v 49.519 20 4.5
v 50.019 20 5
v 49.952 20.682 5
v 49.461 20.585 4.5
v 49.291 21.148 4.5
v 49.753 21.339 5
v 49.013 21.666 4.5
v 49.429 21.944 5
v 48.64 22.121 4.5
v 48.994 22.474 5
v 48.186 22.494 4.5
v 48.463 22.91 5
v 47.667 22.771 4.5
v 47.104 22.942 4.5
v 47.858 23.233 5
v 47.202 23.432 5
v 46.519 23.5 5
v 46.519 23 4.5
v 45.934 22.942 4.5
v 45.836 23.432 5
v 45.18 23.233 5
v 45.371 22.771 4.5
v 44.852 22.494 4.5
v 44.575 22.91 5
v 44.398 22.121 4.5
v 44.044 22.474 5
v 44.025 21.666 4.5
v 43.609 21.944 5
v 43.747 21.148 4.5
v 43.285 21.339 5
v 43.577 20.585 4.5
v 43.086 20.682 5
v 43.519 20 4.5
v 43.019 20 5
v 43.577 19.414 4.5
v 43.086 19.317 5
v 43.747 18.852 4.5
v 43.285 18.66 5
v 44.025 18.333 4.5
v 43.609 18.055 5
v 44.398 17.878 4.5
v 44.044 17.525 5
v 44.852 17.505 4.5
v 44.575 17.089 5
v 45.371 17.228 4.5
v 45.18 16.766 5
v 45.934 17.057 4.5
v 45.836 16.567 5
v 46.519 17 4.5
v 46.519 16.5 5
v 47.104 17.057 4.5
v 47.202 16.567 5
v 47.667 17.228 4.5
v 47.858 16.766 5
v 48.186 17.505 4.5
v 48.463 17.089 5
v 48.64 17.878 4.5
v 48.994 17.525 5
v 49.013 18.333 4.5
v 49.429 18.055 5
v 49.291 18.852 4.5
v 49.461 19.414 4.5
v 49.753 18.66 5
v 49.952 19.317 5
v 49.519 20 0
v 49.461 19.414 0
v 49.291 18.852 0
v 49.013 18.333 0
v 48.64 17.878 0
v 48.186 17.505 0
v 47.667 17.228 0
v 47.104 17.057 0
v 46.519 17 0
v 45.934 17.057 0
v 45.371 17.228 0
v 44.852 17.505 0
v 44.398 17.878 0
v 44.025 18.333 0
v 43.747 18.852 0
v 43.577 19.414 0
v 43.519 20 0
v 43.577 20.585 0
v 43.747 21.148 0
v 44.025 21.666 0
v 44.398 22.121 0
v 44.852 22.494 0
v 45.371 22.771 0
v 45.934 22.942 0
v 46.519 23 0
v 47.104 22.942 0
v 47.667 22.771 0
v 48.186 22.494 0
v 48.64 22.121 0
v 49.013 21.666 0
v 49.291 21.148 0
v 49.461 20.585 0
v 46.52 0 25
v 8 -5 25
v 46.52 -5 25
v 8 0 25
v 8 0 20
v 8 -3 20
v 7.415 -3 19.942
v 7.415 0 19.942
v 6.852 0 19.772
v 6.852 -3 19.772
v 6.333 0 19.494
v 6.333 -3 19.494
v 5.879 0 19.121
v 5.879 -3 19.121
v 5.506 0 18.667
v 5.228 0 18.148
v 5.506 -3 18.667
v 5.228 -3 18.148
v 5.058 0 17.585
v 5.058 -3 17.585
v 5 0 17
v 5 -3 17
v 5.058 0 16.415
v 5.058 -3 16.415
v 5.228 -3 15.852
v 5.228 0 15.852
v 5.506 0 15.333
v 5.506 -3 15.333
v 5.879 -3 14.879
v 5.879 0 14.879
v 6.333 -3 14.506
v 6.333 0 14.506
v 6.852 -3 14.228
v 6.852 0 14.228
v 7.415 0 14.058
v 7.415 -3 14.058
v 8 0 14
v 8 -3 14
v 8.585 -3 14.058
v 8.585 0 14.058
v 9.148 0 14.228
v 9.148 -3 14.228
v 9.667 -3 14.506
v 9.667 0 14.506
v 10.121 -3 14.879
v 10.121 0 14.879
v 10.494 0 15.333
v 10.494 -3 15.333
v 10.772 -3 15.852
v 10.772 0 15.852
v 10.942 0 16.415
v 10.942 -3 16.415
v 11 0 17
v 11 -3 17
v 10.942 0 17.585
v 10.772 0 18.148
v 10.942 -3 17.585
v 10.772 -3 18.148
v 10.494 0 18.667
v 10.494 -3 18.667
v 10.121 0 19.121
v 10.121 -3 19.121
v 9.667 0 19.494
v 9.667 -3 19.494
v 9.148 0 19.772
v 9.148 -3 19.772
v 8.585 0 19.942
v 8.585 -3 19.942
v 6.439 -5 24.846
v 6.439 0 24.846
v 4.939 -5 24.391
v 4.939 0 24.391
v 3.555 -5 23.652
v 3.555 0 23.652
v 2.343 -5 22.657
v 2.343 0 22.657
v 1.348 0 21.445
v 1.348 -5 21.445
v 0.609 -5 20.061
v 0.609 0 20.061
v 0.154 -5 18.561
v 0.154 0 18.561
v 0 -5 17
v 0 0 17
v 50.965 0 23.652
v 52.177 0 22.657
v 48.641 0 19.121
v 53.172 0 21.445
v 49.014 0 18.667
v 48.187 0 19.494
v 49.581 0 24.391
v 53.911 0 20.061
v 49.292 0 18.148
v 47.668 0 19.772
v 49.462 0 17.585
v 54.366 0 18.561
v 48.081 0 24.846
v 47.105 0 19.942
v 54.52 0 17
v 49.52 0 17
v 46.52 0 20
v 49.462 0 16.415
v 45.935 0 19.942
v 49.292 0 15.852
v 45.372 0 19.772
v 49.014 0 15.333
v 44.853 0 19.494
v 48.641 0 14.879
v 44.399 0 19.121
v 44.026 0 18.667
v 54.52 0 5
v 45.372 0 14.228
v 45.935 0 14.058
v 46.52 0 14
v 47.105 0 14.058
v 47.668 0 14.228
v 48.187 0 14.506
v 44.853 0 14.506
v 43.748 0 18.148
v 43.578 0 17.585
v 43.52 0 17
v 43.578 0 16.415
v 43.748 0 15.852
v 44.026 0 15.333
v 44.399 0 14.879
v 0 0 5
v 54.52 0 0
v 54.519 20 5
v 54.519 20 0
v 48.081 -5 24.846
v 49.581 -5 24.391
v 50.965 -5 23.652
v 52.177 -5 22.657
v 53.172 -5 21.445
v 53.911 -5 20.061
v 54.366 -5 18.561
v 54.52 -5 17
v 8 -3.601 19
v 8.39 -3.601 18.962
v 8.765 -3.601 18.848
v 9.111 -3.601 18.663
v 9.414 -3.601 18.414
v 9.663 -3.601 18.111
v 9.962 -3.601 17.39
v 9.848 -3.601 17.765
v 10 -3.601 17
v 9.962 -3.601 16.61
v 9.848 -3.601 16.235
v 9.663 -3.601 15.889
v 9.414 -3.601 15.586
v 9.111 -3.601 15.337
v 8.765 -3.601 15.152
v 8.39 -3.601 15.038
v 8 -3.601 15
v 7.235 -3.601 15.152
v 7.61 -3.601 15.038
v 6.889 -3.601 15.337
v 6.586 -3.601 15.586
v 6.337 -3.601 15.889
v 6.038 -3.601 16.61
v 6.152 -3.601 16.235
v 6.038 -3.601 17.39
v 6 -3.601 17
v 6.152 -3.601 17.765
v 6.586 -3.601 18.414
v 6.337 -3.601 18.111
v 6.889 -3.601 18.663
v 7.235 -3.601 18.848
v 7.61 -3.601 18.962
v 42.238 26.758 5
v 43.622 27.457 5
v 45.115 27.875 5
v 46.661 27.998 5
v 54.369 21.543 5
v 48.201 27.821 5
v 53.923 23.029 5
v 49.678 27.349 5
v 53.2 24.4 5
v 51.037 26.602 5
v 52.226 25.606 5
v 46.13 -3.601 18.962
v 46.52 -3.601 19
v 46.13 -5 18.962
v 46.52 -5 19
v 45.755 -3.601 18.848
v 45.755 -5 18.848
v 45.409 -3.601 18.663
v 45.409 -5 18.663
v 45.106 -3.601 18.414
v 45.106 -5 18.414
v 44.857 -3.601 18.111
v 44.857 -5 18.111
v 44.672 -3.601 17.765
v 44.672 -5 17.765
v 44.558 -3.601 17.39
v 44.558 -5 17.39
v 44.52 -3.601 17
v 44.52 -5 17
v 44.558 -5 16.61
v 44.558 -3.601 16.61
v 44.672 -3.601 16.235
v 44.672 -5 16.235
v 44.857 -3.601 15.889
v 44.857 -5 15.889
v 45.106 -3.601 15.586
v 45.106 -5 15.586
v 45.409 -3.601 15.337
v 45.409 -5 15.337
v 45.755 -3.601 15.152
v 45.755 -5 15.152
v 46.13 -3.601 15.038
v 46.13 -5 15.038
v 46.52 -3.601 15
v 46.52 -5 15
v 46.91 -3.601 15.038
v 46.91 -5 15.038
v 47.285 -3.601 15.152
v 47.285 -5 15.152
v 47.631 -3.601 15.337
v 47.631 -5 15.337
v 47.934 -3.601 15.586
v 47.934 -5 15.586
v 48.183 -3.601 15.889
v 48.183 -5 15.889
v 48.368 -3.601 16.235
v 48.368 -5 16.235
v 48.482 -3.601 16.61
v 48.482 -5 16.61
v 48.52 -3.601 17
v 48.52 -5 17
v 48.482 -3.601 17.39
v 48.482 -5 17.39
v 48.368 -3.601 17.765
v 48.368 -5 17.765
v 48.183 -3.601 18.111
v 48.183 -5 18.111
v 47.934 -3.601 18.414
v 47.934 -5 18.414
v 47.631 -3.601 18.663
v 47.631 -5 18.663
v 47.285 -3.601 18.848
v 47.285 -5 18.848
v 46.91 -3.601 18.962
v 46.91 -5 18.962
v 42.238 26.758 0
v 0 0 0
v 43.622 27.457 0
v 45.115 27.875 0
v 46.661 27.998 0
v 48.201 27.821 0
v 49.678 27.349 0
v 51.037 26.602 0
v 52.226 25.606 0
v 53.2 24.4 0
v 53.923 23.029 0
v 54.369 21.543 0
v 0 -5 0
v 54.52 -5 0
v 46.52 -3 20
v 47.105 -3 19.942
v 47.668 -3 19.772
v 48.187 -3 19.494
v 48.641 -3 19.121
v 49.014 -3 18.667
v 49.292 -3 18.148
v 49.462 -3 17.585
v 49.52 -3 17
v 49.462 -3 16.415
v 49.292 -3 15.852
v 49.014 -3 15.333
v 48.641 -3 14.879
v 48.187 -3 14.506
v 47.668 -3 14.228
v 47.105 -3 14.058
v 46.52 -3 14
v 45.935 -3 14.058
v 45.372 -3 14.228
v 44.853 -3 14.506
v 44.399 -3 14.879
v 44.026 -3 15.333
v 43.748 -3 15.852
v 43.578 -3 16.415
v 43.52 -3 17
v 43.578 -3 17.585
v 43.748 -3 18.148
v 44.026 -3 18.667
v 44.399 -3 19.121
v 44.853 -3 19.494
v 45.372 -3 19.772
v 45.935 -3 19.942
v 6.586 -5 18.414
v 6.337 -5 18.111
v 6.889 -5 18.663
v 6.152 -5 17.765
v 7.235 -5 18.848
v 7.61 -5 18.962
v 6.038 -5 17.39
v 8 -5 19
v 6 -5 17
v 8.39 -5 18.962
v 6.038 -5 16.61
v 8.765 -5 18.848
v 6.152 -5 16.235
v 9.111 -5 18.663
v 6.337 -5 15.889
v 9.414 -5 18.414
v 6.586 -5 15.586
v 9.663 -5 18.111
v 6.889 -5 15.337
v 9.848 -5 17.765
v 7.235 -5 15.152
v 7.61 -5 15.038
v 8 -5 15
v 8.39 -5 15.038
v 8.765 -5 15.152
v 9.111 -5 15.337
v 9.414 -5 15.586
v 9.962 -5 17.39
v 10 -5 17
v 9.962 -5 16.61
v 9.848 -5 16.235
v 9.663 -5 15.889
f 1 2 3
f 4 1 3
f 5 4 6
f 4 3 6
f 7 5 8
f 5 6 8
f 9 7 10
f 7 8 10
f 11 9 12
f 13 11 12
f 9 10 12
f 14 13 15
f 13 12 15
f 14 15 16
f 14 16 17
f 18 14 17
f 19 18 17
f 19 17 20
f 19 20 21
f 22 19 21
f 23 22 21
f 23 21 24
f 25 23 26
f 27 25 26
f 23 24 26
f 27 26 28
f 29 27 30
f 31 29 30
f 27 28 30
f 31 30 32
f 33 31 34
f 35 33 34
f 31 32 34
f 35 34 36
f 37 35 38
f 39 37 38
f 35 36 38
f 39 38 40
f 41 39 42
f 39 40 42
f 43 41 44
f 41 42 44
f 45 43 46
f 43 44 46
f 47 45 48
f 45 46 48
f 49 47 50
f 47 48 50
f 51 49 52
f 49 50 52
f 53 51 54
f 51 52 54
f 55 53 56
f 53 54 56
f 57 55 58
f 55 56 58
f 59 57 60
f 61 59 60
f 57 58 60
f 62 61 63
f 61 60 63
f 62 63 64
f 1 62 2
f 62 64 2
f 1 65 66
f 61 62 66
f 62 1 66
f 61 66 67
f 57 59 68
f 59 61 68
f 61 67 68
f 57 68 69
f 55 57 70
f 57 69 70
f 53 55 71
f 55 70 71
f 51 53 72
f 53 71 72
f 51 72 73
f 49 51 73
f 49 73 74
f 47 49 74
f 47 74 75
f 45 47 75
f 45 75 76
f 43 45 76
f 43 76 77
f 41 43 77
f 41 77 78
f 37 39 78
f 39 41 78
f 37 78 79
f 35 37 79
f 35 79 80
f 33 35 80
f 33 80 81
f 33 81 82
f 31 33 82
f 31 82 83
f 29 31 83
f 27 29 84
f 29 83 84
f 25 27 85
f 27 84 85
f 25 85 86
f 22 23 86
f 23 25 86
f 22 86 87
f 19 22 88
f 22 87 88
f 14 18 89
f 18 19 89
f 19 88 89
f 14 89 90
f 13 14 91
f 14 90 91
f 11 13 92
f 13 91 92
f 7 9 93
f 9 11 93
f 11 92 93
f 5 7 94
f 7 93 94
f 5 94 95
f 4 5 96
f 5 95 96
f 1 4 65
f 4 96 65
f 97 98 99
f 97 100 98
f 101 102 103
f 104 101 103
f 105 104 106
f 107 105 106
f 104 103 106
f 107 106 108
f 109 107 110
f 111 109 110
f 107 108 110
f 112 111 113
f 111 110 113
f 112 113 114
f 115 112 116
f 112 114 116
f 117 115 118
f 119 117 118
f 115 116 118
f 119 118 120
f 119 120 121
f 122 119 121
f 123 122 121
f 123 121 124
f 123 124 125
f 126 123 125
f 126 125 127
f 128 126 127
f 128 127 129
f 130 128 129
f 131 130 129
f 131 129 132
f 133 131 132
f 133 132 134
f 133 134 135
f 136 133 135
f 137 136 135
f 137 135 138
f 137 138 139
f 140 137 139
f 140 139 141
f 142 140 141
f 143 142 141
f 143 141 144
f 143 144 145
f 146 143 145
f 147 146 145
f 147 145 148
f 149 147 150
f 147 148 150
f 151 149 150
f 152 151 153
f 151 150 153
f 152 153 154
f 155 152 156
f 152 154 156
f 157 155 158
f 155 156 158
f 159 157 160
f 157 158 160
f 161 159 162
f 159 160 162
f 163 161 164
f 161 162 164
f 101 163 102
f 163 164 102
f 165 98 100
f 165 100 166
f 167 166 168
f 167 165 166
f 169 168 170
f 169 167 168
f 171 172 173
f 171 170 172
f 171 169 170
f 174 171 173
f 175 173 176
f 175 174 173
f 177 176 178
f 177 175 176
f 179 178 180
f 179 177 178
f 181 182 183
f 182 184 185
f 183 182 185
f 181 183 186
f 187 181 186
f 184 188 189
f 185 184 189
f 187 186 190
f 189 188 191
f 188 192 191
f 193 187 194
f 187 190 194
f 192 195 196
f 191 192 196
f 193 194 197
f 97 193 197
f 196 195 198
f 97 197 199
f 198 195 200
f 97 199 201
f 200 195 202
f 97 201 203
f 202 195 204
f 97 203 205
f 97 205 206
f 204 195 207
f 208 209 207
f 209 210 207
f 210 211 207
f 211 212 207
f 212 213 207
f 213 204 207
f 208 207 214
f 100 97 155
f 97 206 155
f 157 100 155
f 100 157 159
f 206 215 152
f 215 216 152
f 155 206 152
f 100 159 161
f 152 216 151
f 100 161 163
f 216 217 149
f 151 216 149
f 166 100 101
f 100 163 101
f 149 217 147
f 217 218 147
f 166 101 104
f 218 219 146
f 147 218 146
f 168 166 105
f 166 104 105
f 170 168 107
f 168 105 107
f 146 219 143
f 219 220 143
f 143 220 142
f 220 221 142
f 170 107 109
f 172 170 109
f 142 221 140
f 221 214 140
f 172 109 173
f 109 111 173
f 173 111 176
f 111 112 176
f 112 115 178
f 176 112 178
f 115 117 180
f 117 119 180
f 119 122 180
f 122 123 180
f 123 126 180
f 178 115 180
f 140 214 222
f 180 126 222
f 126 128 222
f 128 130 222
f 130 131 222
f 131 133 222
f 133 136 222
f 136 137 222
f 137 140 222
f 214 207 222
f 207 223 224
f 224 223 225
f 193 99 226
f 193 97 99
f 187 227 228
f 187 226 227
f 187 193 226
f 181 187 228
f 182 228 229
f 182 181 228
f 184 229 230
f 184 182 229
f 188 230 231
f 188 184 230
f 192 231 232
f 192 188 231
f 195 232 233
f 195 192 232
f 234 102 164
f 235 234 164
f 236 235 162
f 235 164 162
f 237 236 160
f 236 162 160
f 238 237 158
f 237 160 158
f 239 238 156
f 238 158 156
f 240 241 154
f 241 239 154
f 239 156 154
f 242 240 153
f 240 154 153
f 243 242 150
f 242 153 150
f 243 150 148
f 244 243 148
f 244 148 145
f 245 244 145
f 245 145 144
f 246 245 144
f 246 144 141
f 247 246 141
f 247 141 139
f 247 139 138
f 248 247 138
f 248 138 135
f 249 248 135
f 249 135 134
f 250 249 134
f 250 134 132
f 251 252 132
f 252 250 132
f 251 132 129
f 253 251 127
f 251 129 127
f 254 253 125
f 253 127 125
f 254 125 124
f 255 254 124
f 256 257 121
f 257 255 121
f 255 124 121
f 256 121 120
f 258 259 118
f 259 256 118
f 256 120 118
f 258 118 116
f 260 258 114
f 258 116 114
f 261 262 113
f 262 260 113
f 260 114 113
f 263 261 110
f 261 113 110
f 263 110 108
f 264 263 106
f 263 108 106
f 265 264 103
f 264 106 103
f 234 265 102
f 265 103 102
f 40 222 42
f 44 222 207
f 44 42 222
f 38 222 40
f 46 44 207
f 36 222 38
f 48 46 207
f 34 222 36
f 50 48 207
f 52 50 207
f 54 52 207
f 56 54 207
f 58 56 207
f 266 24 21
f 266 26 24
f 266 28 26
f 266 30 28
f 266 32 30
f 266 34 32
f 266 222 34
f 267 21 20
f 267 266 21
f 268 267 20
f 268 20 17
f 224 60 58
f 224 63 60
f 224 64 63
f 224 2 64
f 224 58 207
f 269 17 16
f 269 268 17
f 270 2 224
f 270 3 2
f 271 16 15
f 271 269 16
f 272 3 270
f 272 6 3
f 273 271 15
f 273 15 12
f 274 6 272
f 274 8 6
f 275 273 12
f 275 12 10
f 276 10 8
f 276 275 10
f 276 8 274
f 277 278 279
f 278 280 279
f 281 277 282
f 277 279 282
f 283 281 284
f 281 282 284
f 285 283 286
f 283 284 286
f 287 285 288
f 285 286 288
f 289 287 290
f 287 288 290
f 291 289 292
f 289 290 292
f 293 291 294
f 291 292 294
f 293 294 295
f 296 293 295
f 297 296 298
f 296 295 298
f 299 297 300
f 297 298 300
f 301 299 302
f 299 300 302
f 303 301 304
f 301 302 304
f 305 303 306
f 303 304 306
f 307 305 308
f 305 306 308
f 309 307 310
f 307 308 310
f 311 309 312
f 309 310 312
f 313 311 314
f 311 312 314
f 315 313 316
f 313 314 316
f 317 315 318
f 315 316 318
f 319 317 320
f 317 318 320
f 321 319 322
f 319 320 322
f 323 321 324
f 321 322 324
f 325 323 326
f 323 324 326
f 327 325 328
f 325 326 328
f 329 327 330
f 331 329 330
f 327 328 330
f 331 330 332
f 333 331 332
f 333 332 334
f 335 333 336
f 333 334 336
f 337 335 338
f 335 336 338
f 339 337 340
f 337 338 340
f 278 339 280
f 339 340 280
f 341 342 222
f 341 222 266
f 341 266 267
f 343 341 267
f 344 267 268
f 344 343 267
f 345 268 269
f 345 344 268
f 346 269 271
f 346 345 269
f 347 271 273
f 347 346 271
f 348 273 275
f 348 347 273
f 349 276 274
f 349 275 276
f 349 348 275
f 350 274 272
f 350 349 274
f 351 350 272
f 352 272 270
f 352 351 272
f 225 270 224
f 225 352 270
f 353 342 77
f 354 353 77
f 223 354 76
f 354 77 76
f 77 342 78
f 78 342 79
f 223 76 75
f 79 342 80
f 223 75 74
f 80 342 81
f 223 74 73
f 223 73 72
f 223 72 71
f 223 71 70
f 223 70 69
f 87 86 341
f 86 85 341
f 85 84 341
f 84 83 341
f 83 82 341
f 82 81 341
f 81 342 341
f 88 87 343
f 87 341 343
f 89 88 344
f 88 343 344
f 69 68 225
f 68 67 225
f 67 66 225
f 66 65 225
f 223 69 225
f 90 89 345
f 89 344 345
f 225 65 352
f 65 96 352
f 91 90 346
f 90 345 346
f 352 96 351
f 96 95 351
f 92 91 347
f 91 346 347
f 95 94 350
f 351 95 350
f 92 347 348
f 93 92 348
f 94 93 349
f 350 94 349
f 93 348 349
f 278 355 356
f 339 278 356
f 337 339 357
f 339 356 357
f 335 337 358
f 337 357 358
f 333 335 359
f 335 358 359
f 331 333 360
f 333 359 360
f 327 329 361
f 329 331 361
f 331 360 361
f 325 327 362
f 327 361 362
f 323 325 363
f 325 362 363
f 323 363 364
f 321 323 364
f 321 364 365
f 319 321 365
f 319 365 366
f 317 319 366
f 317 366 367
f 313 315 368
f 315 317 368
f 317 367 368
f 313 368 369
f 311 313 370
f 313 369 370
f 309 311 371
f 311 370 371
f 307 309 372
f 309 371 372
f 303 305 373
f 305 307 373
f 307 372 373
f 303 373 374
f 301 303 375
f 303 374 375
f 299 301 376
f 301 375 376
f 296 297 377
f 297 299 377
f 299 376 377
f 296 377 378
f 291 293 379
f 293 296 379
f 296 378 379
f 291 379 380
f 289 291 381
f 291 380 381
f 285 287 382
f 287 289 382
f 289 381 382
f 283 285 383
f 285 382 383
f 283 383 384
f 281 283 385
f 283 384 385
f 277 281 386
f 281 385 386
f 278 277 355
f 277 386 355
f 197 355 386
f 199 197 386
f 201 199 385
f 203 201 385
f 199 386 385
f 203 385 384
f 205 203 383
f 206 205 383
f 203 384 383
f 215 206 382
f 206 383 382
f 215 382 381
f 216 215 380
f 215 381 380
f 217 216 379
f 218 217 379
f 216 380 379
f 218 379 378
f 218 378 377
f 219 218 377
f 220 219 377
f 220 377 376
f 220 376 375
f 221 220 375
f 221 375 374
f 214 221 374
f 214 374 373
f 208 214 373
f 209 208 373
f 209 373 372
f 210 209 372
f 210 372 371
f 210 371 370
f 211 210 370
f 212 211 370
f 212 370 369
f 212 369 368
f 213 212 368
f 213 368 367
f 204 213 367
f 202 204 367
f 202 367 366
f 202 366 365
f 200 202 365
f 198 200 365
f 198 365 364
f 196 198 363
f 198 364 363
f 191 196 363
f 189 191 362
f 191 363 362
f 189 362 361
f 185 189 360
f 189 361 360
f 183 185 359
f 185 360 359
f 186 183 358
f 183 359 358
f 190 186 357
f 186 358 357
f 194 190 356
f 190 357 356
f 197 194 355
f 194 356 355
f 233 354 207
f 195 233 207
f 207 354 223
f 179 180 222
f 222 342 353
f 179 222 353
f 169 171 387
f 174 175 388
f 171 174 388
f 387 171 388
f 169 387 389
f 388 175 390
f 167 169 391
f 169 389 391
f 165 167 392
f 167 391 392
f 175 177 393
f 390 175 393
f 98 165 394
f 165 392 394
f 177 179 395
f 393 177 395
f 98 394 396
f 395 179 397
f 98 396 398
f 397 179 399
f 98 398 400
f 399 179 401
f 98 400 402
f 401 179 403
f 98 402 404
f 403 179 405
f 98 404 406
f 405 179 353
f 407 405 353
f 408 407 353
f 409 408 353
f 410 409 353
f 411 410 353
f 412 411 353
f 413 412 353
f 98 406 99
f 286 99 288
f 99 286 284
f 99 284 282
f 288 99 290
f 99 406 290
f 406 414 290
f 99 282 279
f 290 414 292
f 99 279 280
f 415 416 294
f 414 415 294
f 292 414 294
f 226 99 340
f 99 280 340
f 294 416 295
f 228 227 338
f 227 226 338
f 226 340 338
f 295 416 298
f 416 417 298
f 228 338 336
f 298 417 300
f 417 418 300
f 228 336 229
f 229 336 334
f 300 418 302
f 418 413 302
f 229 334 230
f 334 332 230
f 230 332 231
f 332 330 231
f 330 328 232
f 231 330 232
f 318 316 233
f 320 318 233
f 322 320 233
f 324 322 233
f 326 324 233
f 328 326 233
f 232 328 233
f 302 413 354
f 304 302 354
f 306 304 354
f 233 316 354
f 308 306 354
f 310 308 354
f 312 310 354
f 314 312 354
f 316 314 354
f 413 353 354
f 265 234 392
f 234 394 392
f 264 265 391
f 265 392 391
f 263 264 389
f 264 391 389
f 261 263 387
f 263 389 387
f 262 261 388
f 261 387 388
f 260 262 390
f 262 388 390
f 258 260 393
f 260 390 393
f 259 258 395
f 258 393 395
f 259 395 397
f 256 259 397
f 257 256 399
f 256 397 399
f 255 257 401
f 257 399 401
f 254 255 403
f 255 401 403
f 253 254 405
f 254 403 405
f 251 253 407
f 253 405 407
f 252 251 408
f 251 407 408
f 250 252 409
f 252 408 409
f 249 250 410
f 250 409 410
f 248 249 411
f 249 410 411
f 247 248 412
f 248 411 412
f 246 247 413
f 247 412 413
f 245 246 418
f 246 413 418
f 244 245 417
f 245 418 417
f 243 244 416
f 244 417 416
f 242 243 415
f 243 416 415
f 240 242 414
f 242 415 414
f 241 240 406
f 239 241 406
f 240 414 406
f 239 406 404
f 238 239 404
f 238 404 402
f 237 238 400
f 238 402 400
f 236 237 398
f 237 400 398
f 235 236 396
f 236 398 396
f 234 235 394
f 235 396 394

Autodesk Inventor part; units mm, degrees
ref_plane "YZ Plane" through (0, 0, 0) normal (1, 0, 0) x (0, 1, 0)
ref_plane "XZ Plane" through (0, 0, 0) normal (0, 1, 0) x (-1, 0, 0)
ref_plane "XY Plane" through (0, 0, 0) normal (0, 0, 1) x (1, 0, 0)
sketch "Boceto1" plane through (0, 0, 0) normal (0, 0, 1) x (1, 0, 0)
  circle A0 centre (46.519, 19.9996) radius 3
  arc A1 (54.519, 20) -> (42.2378, 26.7576) centre (46.519, 19.9996) ccw
  line L0 (54.52, 0) -> (54.519, 20)
  line L1 (0, 0) -> (42.2378, 26.7576)
  line L2 (0, 0) -> (0, -5)
  line L3 (0, -5) -> (54.52, -5)
  line L4 (54.52, -5) -> (54.52, 0)
  dimension "d5" = 50
  dimension "d6" = 20
  dimension "d8" = 5
  dimension "d9" = 54.52
extrude "Extrusión1" add sketch "Boceto1" along normal blind 5
sketch "Boceto2" plane through (0, 0, 5) normal (0, 0, 1) x (1, 0, 0)
  line L0 (0, 0) -> (0, -5) projected
  line L1 (0, 0) -> (0, -5)
  line L2 (0, -5) -> (54.52, -5) projected
  line L3 (0, -5) -> (54.52, -5)
  line L4 (54.52, -5) -> (54.52, 0) projected
  line L5 (54.52, -5) -> (54.52, 0)
  line L6 (54.52, 0) -> (0, 0)
extrude "Extrusión2" add sketch "Boceto2" along normal blind 20
fillet "Empalme1" radius 8 2 edges at (54.52, -2.5, 25) (0, -2.5, 25)
sketch "Boceto3" plane through (0, 0, 5) normal (0, 1, 0) x (1, 0, 0)
  circle A0 centre (8, -12) radius 3
  circle A1 centre (46.52, -12) radius 3
  point P0 (0, 5)
  dimension "d15" = 6
  dimension "d16" = 6
hole "Agujero1" at (8, 0, 17) at (46.52, 0, 17) direction (0, -1, 0) diameter 6 depth 3 tip angle 118
sketch "Boceto4" plane through (0, 0, 5) normal (0, 1, 0) x (1, 0, 0)
  circle A0 centre (8, -12) radius 3 projected
  circle A1 centre (46.52, -12) radius 3 projected
  point P0 (0, 5)
hole "Agujero2" at (46.52, 0, 17) at (8, 0, 17) direction (0, -1, 0) diameter 4 depth 5 tip angle 118
chamfer "Chaflán1" distance 0.5 angle 45 1 edges at (43.519, 19.9996, 5) measured on face at (33.1116, 5.8435, 5)
properties material "Cobre"
